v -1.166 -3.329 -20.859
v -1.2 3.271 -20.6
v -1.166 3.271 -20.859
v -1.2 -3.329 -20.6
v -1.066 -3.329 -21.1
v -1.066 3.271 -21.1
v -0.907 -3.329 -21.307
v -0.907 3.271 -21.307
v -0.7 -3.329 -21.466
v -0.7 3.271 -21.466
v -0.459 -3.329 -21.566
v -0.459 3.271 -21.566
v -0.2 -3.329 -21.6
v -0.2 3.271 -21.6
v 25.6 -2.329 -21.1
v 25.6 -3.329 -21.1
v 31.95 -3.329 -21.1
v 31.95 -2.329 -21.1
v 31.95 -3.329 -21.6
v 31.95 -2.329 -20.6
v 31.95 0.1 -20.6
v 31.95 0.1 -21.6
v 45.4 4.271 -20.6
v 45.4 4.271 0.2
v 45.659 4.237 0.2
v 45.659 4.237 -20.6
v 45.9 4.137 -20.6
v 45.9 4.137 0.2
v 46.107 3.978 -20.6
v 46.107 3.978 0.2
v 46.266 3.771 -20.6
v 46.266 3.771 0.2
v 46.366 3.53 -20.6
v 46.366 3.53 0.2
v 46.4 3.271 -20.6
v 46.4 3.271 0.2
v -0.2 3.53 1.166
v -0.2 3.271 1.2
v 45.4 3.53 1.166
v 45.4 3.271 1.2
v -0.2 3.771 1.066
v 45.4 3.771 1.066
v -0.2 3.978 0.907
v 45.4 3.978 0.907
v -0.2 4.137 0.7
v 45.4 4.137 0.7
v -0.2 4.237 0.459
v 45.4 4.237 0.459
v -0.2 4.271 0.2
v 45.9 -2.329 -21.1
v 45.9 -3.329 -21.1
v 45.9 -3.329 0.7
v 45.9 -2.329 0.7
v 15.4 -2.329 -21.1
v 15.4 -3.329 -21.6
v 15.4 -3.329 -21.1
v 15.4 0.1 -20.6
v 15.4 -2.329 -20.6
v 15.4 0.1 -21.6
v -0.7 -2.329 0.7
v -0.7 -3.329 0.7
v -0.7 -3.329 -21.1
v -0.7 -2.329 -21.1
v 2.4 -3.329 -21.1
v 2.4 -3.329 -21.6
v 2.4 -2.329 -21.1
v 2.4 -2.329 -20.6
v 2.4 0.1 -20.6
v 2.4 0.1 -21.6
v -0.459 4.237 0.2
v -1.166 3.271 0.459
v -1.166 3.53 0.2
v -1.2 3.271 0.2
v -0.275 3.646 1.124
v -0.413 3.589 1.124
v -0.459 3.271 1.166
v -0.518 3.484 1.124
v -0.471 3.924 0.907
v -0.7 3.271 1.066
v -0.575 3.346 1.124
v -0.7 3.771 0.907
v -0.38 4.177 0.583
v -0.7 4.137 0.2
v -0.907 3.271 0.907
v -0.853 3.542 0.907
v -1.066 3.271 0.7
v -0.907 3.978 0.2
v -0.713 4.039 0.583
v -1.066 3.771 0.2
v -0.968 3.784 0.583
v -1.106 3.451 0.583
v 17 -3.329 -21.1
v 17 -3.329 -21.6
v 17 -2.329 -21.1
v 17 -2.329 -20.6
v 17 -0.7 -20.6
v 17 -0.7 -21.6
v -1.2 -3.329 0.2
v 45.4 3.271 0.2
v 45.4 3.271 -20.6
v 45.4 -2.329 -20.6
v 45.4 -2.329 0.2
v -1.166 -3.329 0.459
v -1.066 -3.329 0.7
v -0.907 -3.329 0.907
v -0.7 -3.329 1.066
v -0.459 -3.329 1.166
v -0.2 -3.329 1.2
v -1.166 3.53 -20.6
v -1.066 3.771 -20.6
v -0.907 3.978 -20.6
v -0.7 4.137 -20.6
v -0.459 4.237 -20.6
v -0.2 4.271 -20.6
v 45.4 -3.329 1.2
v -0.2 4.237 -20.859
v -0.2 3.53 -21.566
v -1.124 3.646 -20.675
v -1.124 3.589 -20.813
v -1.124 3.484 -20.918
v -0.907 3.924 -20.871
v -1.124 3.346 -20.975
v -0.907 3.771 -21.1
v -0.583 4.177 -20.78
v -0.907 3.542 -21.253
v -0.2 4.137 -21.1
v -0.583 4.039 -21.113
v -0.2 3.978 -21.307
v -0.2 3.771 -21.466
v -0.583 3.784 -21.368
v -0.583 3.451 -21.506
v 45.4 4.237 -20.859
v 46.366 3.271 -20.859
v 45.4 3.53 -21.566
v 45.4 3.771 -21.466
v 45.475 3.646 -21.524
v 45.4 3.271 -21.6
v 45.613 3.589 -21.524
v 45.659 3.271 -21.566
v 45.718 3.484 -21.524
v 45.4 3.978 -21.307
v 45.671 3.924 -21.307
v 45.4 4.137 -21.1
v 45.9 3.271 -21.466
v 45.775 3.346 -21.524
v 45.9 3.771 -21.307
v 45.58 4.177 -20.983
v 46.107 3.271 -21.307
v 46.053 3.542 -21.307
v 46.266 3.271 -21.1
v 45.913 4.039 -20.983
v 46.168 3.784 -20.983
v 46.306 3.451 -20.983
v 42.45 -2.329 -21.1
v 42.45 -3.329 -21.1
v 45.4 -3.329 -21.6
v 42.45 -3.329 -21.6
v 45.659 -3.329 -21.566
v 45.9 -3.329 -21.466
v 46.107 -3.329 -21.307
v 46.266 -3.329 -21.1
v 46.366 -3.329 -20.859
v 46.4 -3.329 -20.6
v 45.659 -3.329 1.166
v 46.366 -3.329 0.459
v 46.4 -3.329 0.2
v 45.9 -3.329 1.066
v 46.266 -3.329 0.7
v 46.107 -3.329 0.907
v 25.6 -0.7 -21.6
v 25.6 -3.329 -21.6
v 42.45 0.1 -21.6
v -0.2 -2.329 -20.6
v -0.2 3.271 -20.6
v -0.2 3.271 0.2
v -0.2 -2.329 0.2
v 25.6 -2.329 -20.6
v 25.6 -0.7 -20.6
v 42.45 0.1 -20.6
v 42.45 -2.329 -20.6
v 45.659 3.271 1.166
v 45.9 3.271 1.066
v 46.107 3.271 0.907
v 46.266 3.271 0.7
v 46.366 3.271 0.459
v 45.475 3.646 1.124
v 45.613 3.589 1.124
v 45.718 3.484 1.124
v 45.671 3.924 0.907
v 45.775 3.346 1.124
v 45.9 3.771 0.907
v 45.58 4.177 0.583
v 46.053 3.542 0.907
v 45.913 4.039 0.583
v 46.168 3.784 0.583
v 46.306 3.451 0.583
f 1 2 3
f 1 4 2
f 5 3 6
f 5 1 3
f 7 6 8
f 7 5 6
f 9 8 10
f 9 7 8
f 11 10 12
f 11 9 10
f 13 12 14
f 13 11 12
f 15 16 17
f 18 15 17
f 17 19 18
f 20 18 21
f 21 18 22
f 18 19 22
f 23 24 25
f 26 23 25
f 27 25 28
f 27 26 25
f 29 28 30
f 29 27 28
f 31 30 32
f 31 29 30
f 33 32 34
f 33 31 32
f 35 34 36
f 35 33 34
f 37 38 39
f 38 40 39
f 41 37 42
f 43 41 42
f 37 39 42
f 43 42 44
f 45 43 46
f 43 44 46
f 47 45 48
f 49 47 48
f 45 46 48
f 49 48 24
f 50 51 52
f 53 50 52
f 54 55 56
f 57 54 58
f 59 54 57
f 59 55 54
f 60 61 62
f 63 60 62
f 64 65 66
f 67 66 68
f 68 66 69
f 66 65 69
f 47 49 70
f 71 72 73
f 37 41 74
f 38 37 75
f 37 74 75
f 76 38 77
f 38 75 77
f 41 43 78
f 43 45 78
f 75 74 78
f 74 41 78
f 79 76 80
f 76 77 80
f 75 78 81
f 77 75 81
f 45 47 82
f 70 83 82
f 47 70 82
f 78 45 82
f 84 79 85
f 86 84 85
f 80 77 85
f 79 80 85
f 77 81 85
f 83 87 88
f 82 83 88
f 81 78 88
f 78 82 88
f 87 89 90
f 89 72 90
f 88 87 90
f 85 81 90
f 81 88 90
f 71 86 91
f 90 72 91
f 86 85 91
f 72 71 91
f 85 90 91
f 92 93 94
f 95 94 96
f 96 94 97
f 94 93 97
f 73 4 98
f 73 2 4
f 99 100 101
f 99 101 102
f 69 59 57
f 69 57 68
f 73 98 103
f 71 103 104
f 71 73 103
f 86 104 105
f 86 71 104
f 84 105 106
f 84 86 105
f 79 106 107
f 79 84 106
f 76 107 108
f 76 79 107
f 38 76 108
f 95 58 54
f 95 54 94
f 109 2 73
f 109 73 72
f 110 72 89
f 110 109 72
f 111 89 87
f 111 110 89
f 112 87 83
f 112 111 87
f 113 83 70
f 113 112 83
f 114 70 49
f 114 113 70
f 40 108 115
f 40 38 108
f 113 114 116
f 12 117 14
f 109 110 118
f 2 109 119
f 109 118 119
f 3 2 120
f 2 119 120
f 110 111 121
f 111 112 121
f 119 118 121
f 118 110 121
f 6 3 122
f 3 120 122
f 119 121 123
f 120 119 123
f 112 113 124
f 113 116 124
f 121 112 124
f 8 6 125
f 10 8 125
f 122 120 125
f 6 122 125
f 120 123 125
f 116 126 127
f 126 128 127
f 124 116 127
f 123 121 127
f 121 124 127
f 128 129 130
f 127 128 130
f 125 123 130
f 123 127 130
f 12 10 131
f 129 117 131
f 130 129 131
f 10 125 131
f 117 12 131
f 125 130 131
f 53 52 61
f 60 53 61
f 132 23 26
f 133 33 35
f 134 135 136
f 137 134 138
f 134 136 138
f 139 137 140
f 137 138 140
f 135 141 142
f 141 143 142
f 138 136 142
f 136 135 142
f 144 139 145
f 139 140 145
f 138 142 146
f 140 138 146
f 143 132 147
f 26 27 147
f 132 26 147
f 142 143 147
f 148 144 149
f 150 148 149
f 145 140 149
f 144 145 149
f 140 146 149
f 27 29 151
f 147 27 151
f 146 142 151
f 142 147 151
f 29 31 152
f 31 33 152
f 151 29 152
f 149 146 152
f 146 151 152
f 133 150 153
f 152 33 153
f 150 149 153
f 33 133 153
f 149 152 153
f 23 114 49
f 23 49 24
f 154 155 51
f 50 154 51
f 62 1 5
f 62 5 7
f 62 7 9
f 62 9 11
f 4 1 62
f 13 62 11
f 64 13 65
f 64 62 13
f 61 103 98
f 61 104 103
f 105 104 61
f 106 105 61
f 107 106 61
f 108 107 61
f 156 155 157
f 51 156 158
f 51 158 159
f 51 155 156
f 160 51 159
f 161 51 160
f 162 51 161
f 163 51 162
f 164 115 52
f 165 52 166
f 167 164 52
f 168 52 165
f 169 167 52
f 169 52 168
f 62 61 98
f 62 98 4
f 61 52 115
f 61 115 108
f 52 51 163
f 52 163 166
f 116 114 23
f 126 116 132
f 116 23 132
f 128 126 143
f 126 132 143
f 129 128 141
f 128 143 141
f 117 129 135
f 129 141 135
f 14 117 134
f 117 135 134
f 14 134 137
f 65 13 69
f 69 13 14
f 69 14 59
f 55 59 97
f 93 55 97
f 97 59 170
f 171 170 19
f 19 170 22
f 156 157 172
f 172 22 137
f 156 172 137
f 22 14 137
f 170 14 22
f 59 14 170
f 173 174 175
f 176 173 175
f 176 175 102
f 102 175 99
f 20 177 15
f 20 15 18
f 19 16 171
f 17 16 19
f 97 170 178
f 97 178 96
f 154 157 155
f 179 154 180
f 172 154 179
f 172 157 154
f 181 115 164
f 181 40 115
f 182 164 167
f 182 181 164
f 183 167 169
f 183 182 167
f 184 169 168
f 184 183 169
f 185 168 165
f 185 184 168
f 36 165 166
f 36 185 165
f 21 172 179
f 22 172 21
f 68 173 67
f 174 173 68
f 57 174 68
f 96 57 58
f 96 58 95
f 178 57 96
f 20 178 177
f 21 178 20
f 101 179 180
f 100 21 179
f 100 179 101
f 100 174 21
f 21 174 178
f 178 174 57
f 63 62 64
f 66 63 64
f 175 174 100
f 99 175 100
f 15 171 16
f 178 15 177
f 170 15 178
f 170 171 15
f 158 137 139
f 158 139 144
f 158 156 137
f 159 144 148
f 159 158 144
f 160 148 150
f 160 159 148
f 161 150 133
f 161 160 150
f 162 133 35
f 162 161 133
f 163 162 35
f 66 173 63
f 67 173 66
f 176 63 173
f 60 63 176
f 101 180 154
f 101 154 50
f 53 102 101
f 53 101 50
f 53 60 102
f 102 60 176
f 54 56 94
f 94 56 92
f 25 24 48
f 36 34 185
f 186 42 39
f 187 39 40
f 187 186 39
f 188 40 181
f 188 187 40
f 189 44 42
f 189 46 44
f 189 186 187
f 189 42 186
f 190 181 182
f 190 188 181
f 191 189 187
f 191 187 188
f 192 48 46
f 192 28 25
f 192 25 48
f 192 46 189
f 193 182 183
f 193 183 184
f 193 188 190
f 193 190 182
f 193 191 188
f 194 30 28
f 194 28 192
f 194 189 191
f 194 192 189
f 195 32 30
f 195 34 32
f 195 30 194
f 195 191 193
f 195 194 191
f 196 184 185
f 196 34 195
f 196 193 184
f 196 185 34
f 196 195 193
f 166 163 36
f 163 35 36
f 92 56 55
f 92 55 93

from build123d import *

# Parameters (mm, degrees)
SKETCH_2_W          = 47.600012207
SKETCH_2_H          = 22.800017408
SKETCH_2_W_2        = 45.600012207
SKETCH_2_H_2        = 20.800017408
EXTRUDE_1_DEPTH     = 1.6
SKETCH_3_W          = 47.600012207
SKETCH_3_H          = 22.800017408
SKETCH_3_W_2        = 45.600012207
SKETCH_3_H_2        = 20.800017408
EXTRUDE_2_DEPTH     = 2
SKETCH_4_W          = 47.600012207
SKETCH_4_H          = 22.800017408
EXTRUDE_3_DEPTH     = 1
SKETCH_5_W          = 47.600012207
SKETCH_5_H          = 22.800017408
SKETCH_5_W_2        = 45.600012207
SKETCH_5_H_2        = 20.800017408
EXTRUDE_4_DEPTH     = 3
SKETCH_6_W          = 8.6
SKETCH_6_H          = 2.628886846
SKETCH_6_W_2        = 13
SKETCH_6_H_2        = 3.428886378
SKETCH_6_W_3        = 10.5
SKETCH_6_H_3        = 3.428887043
CUT_EXTRUDE_1_DEPTH = 1
SKETCH_7_W          = 1.599774972
SKETCH_7_H          = 0.5
SKETCH_7_W_2        = 6.350027001
CUT_EXTRUDE_2_DEPTH = 1
FILLET_1_R          = 1


with BuildPart() as part:
    # Эскиз2 → Бобышка-Вытянуть1 (new body)
    with BuildSketch(Plane(origin=(0, 1.271117687, 0), x_dir=(1, 0, 0), z_dir=(0, 1, 0))):
        with Locations((22.600006104, 10.200008704)):
            Rectangle(SKETCH_2_W, SKETCH_2_H)
        with Locations((22.600006104, 10.200008704)):
            Rectangle(SKETCH_2_W_2, SKETCH_2_H_2, mode=Mode.SUBTRACT)
    extrude(amount=-EXTRUDE_1_DEPTH)

    # Эскиз3 → Бобышка-Вытянуть2 (add)
    with BuildSketch(Plane(origin=(0, 1.271117687, 0), x_dir=(1, 0, 0), z_dir=(0, 1, 0))):
        with Locations((22.600006104, 10.200008704)):
            Rectangle(SKETCH_3_W, SKETCH_3_H)
        with Locations((22.600006104, 10.200008704)):
            Rectangle(SKETCH_3_W_2, SKETCH_3_H_2, mode=Mode.SUBTRACT)
    extrude(amount=EXTRUDE_2_DEPTH)

    # Эскиз4 → Бобышка-Вытянуть3 (add)
    with BuildSketch(Plane(origin=(0, 3.271117687, 0), x_dir=(1, 0, 0), z_dir=(0, 1, 0))):
        with Locations((22.600006104, 10.200008704)):
            Rectangle(SKETCH_4_W, SKETCH_4_H)
    extrude(amount=EXTRUDE_3_DEPTH)

    # Эскиз5 → Бобышка-Вытянуть4 (add)
    with BuildSketch(Plane.XZ.offset(0.328882313)):
        with Locations((22.600006104, -10.200008704)):
            Rectangle(SKETCH_5_W, SKETCH_5_H)
        with Locations((22.600006104, -10.200008704)):
            Rectangle(SKETCH_5_W_2, SKETCH_5_H_2, mode=Mode.SUBTRACT)
    extrude(amount=EXTRUDE_4_DEPTH)

    # Эскиз6 → Вырез-Вытянуть1 (cut)
    with BuildSketch(Plane(origin=(0, 0, -21.600017408), x_dir=(-1, 0, 0), z_dir=(0, 0, -1))):
        with Locations((-21.299859449, -2.01443889)):
            Rectangle(SKETCH_6_W, SKETCH_6_H)
        with Locations((-8.900084477, -1.614439124)):
            Rectangle(SKETCH_6_W_2, SKETCH_6_H_2)
        with Locations((-37.19988645, -1.614438792)):
            Rectangle(SKETCH_6_W_3, SKETCH_6_H_3)
    extrude(amount=-CUT_EXTRUDE_1_DEPTH, mode=Mode.SUBTRACT)

    # Эскиз7 → Вырез-Вытянуть2 (cut)
    with BuildSketch(Plane.XZ.offset(3.328882313)):
        Polygon((-0.2, 0.2), (45.400012207, 0.2), (45.400012207, -20.600017408), (42.44988645, -20.600017408), (42.44988645, -21.100017408), (45.900012207, -21.100017408), (45.900012207, 0.7), (-0.7, 0.7), (-0.7, -21.100017408), (2.400084477, -21.100017408), (2.400084477, -20.600017408), (-0.2, -20.600017408), align=None)
        with Locations((16.199971963, -20.850017408)):
            Rectangle(SKETCH_7_W, SKETCH_7_H)
        with Locations((28.77487295, -20.850017408)):
            Rectangle(SKETCH_7_W_2, SKETCH_7_H)
    extrude(amount=-CUT_EXTRUDE_2_DEPTH, mode=Mode.SUBTRACT)

    # Скругление1
    fillet_1_edges = [part.edges().sort_by_distance(p)[0] for p in [
        (46.400012207, 4.271117687, -10.200008704),
        (22.600006104, 4.271117687, -21.600017408),
        (-1.2, 4.271117687, -10.200008704),
        (22.600006104, 4.271117687, 1.2),
        (-1.2, 0.471117687, 1.2),
        (-1.2, 0.471117687, -21.600017408),
        (46.400012207, 0.471117687, -21.600017408),
        (46.400012207, 0.471117687, 1.2),
    ]]
    fillet(fillet_1_edges, radius=FILLET_1_R)


solid = part.part
